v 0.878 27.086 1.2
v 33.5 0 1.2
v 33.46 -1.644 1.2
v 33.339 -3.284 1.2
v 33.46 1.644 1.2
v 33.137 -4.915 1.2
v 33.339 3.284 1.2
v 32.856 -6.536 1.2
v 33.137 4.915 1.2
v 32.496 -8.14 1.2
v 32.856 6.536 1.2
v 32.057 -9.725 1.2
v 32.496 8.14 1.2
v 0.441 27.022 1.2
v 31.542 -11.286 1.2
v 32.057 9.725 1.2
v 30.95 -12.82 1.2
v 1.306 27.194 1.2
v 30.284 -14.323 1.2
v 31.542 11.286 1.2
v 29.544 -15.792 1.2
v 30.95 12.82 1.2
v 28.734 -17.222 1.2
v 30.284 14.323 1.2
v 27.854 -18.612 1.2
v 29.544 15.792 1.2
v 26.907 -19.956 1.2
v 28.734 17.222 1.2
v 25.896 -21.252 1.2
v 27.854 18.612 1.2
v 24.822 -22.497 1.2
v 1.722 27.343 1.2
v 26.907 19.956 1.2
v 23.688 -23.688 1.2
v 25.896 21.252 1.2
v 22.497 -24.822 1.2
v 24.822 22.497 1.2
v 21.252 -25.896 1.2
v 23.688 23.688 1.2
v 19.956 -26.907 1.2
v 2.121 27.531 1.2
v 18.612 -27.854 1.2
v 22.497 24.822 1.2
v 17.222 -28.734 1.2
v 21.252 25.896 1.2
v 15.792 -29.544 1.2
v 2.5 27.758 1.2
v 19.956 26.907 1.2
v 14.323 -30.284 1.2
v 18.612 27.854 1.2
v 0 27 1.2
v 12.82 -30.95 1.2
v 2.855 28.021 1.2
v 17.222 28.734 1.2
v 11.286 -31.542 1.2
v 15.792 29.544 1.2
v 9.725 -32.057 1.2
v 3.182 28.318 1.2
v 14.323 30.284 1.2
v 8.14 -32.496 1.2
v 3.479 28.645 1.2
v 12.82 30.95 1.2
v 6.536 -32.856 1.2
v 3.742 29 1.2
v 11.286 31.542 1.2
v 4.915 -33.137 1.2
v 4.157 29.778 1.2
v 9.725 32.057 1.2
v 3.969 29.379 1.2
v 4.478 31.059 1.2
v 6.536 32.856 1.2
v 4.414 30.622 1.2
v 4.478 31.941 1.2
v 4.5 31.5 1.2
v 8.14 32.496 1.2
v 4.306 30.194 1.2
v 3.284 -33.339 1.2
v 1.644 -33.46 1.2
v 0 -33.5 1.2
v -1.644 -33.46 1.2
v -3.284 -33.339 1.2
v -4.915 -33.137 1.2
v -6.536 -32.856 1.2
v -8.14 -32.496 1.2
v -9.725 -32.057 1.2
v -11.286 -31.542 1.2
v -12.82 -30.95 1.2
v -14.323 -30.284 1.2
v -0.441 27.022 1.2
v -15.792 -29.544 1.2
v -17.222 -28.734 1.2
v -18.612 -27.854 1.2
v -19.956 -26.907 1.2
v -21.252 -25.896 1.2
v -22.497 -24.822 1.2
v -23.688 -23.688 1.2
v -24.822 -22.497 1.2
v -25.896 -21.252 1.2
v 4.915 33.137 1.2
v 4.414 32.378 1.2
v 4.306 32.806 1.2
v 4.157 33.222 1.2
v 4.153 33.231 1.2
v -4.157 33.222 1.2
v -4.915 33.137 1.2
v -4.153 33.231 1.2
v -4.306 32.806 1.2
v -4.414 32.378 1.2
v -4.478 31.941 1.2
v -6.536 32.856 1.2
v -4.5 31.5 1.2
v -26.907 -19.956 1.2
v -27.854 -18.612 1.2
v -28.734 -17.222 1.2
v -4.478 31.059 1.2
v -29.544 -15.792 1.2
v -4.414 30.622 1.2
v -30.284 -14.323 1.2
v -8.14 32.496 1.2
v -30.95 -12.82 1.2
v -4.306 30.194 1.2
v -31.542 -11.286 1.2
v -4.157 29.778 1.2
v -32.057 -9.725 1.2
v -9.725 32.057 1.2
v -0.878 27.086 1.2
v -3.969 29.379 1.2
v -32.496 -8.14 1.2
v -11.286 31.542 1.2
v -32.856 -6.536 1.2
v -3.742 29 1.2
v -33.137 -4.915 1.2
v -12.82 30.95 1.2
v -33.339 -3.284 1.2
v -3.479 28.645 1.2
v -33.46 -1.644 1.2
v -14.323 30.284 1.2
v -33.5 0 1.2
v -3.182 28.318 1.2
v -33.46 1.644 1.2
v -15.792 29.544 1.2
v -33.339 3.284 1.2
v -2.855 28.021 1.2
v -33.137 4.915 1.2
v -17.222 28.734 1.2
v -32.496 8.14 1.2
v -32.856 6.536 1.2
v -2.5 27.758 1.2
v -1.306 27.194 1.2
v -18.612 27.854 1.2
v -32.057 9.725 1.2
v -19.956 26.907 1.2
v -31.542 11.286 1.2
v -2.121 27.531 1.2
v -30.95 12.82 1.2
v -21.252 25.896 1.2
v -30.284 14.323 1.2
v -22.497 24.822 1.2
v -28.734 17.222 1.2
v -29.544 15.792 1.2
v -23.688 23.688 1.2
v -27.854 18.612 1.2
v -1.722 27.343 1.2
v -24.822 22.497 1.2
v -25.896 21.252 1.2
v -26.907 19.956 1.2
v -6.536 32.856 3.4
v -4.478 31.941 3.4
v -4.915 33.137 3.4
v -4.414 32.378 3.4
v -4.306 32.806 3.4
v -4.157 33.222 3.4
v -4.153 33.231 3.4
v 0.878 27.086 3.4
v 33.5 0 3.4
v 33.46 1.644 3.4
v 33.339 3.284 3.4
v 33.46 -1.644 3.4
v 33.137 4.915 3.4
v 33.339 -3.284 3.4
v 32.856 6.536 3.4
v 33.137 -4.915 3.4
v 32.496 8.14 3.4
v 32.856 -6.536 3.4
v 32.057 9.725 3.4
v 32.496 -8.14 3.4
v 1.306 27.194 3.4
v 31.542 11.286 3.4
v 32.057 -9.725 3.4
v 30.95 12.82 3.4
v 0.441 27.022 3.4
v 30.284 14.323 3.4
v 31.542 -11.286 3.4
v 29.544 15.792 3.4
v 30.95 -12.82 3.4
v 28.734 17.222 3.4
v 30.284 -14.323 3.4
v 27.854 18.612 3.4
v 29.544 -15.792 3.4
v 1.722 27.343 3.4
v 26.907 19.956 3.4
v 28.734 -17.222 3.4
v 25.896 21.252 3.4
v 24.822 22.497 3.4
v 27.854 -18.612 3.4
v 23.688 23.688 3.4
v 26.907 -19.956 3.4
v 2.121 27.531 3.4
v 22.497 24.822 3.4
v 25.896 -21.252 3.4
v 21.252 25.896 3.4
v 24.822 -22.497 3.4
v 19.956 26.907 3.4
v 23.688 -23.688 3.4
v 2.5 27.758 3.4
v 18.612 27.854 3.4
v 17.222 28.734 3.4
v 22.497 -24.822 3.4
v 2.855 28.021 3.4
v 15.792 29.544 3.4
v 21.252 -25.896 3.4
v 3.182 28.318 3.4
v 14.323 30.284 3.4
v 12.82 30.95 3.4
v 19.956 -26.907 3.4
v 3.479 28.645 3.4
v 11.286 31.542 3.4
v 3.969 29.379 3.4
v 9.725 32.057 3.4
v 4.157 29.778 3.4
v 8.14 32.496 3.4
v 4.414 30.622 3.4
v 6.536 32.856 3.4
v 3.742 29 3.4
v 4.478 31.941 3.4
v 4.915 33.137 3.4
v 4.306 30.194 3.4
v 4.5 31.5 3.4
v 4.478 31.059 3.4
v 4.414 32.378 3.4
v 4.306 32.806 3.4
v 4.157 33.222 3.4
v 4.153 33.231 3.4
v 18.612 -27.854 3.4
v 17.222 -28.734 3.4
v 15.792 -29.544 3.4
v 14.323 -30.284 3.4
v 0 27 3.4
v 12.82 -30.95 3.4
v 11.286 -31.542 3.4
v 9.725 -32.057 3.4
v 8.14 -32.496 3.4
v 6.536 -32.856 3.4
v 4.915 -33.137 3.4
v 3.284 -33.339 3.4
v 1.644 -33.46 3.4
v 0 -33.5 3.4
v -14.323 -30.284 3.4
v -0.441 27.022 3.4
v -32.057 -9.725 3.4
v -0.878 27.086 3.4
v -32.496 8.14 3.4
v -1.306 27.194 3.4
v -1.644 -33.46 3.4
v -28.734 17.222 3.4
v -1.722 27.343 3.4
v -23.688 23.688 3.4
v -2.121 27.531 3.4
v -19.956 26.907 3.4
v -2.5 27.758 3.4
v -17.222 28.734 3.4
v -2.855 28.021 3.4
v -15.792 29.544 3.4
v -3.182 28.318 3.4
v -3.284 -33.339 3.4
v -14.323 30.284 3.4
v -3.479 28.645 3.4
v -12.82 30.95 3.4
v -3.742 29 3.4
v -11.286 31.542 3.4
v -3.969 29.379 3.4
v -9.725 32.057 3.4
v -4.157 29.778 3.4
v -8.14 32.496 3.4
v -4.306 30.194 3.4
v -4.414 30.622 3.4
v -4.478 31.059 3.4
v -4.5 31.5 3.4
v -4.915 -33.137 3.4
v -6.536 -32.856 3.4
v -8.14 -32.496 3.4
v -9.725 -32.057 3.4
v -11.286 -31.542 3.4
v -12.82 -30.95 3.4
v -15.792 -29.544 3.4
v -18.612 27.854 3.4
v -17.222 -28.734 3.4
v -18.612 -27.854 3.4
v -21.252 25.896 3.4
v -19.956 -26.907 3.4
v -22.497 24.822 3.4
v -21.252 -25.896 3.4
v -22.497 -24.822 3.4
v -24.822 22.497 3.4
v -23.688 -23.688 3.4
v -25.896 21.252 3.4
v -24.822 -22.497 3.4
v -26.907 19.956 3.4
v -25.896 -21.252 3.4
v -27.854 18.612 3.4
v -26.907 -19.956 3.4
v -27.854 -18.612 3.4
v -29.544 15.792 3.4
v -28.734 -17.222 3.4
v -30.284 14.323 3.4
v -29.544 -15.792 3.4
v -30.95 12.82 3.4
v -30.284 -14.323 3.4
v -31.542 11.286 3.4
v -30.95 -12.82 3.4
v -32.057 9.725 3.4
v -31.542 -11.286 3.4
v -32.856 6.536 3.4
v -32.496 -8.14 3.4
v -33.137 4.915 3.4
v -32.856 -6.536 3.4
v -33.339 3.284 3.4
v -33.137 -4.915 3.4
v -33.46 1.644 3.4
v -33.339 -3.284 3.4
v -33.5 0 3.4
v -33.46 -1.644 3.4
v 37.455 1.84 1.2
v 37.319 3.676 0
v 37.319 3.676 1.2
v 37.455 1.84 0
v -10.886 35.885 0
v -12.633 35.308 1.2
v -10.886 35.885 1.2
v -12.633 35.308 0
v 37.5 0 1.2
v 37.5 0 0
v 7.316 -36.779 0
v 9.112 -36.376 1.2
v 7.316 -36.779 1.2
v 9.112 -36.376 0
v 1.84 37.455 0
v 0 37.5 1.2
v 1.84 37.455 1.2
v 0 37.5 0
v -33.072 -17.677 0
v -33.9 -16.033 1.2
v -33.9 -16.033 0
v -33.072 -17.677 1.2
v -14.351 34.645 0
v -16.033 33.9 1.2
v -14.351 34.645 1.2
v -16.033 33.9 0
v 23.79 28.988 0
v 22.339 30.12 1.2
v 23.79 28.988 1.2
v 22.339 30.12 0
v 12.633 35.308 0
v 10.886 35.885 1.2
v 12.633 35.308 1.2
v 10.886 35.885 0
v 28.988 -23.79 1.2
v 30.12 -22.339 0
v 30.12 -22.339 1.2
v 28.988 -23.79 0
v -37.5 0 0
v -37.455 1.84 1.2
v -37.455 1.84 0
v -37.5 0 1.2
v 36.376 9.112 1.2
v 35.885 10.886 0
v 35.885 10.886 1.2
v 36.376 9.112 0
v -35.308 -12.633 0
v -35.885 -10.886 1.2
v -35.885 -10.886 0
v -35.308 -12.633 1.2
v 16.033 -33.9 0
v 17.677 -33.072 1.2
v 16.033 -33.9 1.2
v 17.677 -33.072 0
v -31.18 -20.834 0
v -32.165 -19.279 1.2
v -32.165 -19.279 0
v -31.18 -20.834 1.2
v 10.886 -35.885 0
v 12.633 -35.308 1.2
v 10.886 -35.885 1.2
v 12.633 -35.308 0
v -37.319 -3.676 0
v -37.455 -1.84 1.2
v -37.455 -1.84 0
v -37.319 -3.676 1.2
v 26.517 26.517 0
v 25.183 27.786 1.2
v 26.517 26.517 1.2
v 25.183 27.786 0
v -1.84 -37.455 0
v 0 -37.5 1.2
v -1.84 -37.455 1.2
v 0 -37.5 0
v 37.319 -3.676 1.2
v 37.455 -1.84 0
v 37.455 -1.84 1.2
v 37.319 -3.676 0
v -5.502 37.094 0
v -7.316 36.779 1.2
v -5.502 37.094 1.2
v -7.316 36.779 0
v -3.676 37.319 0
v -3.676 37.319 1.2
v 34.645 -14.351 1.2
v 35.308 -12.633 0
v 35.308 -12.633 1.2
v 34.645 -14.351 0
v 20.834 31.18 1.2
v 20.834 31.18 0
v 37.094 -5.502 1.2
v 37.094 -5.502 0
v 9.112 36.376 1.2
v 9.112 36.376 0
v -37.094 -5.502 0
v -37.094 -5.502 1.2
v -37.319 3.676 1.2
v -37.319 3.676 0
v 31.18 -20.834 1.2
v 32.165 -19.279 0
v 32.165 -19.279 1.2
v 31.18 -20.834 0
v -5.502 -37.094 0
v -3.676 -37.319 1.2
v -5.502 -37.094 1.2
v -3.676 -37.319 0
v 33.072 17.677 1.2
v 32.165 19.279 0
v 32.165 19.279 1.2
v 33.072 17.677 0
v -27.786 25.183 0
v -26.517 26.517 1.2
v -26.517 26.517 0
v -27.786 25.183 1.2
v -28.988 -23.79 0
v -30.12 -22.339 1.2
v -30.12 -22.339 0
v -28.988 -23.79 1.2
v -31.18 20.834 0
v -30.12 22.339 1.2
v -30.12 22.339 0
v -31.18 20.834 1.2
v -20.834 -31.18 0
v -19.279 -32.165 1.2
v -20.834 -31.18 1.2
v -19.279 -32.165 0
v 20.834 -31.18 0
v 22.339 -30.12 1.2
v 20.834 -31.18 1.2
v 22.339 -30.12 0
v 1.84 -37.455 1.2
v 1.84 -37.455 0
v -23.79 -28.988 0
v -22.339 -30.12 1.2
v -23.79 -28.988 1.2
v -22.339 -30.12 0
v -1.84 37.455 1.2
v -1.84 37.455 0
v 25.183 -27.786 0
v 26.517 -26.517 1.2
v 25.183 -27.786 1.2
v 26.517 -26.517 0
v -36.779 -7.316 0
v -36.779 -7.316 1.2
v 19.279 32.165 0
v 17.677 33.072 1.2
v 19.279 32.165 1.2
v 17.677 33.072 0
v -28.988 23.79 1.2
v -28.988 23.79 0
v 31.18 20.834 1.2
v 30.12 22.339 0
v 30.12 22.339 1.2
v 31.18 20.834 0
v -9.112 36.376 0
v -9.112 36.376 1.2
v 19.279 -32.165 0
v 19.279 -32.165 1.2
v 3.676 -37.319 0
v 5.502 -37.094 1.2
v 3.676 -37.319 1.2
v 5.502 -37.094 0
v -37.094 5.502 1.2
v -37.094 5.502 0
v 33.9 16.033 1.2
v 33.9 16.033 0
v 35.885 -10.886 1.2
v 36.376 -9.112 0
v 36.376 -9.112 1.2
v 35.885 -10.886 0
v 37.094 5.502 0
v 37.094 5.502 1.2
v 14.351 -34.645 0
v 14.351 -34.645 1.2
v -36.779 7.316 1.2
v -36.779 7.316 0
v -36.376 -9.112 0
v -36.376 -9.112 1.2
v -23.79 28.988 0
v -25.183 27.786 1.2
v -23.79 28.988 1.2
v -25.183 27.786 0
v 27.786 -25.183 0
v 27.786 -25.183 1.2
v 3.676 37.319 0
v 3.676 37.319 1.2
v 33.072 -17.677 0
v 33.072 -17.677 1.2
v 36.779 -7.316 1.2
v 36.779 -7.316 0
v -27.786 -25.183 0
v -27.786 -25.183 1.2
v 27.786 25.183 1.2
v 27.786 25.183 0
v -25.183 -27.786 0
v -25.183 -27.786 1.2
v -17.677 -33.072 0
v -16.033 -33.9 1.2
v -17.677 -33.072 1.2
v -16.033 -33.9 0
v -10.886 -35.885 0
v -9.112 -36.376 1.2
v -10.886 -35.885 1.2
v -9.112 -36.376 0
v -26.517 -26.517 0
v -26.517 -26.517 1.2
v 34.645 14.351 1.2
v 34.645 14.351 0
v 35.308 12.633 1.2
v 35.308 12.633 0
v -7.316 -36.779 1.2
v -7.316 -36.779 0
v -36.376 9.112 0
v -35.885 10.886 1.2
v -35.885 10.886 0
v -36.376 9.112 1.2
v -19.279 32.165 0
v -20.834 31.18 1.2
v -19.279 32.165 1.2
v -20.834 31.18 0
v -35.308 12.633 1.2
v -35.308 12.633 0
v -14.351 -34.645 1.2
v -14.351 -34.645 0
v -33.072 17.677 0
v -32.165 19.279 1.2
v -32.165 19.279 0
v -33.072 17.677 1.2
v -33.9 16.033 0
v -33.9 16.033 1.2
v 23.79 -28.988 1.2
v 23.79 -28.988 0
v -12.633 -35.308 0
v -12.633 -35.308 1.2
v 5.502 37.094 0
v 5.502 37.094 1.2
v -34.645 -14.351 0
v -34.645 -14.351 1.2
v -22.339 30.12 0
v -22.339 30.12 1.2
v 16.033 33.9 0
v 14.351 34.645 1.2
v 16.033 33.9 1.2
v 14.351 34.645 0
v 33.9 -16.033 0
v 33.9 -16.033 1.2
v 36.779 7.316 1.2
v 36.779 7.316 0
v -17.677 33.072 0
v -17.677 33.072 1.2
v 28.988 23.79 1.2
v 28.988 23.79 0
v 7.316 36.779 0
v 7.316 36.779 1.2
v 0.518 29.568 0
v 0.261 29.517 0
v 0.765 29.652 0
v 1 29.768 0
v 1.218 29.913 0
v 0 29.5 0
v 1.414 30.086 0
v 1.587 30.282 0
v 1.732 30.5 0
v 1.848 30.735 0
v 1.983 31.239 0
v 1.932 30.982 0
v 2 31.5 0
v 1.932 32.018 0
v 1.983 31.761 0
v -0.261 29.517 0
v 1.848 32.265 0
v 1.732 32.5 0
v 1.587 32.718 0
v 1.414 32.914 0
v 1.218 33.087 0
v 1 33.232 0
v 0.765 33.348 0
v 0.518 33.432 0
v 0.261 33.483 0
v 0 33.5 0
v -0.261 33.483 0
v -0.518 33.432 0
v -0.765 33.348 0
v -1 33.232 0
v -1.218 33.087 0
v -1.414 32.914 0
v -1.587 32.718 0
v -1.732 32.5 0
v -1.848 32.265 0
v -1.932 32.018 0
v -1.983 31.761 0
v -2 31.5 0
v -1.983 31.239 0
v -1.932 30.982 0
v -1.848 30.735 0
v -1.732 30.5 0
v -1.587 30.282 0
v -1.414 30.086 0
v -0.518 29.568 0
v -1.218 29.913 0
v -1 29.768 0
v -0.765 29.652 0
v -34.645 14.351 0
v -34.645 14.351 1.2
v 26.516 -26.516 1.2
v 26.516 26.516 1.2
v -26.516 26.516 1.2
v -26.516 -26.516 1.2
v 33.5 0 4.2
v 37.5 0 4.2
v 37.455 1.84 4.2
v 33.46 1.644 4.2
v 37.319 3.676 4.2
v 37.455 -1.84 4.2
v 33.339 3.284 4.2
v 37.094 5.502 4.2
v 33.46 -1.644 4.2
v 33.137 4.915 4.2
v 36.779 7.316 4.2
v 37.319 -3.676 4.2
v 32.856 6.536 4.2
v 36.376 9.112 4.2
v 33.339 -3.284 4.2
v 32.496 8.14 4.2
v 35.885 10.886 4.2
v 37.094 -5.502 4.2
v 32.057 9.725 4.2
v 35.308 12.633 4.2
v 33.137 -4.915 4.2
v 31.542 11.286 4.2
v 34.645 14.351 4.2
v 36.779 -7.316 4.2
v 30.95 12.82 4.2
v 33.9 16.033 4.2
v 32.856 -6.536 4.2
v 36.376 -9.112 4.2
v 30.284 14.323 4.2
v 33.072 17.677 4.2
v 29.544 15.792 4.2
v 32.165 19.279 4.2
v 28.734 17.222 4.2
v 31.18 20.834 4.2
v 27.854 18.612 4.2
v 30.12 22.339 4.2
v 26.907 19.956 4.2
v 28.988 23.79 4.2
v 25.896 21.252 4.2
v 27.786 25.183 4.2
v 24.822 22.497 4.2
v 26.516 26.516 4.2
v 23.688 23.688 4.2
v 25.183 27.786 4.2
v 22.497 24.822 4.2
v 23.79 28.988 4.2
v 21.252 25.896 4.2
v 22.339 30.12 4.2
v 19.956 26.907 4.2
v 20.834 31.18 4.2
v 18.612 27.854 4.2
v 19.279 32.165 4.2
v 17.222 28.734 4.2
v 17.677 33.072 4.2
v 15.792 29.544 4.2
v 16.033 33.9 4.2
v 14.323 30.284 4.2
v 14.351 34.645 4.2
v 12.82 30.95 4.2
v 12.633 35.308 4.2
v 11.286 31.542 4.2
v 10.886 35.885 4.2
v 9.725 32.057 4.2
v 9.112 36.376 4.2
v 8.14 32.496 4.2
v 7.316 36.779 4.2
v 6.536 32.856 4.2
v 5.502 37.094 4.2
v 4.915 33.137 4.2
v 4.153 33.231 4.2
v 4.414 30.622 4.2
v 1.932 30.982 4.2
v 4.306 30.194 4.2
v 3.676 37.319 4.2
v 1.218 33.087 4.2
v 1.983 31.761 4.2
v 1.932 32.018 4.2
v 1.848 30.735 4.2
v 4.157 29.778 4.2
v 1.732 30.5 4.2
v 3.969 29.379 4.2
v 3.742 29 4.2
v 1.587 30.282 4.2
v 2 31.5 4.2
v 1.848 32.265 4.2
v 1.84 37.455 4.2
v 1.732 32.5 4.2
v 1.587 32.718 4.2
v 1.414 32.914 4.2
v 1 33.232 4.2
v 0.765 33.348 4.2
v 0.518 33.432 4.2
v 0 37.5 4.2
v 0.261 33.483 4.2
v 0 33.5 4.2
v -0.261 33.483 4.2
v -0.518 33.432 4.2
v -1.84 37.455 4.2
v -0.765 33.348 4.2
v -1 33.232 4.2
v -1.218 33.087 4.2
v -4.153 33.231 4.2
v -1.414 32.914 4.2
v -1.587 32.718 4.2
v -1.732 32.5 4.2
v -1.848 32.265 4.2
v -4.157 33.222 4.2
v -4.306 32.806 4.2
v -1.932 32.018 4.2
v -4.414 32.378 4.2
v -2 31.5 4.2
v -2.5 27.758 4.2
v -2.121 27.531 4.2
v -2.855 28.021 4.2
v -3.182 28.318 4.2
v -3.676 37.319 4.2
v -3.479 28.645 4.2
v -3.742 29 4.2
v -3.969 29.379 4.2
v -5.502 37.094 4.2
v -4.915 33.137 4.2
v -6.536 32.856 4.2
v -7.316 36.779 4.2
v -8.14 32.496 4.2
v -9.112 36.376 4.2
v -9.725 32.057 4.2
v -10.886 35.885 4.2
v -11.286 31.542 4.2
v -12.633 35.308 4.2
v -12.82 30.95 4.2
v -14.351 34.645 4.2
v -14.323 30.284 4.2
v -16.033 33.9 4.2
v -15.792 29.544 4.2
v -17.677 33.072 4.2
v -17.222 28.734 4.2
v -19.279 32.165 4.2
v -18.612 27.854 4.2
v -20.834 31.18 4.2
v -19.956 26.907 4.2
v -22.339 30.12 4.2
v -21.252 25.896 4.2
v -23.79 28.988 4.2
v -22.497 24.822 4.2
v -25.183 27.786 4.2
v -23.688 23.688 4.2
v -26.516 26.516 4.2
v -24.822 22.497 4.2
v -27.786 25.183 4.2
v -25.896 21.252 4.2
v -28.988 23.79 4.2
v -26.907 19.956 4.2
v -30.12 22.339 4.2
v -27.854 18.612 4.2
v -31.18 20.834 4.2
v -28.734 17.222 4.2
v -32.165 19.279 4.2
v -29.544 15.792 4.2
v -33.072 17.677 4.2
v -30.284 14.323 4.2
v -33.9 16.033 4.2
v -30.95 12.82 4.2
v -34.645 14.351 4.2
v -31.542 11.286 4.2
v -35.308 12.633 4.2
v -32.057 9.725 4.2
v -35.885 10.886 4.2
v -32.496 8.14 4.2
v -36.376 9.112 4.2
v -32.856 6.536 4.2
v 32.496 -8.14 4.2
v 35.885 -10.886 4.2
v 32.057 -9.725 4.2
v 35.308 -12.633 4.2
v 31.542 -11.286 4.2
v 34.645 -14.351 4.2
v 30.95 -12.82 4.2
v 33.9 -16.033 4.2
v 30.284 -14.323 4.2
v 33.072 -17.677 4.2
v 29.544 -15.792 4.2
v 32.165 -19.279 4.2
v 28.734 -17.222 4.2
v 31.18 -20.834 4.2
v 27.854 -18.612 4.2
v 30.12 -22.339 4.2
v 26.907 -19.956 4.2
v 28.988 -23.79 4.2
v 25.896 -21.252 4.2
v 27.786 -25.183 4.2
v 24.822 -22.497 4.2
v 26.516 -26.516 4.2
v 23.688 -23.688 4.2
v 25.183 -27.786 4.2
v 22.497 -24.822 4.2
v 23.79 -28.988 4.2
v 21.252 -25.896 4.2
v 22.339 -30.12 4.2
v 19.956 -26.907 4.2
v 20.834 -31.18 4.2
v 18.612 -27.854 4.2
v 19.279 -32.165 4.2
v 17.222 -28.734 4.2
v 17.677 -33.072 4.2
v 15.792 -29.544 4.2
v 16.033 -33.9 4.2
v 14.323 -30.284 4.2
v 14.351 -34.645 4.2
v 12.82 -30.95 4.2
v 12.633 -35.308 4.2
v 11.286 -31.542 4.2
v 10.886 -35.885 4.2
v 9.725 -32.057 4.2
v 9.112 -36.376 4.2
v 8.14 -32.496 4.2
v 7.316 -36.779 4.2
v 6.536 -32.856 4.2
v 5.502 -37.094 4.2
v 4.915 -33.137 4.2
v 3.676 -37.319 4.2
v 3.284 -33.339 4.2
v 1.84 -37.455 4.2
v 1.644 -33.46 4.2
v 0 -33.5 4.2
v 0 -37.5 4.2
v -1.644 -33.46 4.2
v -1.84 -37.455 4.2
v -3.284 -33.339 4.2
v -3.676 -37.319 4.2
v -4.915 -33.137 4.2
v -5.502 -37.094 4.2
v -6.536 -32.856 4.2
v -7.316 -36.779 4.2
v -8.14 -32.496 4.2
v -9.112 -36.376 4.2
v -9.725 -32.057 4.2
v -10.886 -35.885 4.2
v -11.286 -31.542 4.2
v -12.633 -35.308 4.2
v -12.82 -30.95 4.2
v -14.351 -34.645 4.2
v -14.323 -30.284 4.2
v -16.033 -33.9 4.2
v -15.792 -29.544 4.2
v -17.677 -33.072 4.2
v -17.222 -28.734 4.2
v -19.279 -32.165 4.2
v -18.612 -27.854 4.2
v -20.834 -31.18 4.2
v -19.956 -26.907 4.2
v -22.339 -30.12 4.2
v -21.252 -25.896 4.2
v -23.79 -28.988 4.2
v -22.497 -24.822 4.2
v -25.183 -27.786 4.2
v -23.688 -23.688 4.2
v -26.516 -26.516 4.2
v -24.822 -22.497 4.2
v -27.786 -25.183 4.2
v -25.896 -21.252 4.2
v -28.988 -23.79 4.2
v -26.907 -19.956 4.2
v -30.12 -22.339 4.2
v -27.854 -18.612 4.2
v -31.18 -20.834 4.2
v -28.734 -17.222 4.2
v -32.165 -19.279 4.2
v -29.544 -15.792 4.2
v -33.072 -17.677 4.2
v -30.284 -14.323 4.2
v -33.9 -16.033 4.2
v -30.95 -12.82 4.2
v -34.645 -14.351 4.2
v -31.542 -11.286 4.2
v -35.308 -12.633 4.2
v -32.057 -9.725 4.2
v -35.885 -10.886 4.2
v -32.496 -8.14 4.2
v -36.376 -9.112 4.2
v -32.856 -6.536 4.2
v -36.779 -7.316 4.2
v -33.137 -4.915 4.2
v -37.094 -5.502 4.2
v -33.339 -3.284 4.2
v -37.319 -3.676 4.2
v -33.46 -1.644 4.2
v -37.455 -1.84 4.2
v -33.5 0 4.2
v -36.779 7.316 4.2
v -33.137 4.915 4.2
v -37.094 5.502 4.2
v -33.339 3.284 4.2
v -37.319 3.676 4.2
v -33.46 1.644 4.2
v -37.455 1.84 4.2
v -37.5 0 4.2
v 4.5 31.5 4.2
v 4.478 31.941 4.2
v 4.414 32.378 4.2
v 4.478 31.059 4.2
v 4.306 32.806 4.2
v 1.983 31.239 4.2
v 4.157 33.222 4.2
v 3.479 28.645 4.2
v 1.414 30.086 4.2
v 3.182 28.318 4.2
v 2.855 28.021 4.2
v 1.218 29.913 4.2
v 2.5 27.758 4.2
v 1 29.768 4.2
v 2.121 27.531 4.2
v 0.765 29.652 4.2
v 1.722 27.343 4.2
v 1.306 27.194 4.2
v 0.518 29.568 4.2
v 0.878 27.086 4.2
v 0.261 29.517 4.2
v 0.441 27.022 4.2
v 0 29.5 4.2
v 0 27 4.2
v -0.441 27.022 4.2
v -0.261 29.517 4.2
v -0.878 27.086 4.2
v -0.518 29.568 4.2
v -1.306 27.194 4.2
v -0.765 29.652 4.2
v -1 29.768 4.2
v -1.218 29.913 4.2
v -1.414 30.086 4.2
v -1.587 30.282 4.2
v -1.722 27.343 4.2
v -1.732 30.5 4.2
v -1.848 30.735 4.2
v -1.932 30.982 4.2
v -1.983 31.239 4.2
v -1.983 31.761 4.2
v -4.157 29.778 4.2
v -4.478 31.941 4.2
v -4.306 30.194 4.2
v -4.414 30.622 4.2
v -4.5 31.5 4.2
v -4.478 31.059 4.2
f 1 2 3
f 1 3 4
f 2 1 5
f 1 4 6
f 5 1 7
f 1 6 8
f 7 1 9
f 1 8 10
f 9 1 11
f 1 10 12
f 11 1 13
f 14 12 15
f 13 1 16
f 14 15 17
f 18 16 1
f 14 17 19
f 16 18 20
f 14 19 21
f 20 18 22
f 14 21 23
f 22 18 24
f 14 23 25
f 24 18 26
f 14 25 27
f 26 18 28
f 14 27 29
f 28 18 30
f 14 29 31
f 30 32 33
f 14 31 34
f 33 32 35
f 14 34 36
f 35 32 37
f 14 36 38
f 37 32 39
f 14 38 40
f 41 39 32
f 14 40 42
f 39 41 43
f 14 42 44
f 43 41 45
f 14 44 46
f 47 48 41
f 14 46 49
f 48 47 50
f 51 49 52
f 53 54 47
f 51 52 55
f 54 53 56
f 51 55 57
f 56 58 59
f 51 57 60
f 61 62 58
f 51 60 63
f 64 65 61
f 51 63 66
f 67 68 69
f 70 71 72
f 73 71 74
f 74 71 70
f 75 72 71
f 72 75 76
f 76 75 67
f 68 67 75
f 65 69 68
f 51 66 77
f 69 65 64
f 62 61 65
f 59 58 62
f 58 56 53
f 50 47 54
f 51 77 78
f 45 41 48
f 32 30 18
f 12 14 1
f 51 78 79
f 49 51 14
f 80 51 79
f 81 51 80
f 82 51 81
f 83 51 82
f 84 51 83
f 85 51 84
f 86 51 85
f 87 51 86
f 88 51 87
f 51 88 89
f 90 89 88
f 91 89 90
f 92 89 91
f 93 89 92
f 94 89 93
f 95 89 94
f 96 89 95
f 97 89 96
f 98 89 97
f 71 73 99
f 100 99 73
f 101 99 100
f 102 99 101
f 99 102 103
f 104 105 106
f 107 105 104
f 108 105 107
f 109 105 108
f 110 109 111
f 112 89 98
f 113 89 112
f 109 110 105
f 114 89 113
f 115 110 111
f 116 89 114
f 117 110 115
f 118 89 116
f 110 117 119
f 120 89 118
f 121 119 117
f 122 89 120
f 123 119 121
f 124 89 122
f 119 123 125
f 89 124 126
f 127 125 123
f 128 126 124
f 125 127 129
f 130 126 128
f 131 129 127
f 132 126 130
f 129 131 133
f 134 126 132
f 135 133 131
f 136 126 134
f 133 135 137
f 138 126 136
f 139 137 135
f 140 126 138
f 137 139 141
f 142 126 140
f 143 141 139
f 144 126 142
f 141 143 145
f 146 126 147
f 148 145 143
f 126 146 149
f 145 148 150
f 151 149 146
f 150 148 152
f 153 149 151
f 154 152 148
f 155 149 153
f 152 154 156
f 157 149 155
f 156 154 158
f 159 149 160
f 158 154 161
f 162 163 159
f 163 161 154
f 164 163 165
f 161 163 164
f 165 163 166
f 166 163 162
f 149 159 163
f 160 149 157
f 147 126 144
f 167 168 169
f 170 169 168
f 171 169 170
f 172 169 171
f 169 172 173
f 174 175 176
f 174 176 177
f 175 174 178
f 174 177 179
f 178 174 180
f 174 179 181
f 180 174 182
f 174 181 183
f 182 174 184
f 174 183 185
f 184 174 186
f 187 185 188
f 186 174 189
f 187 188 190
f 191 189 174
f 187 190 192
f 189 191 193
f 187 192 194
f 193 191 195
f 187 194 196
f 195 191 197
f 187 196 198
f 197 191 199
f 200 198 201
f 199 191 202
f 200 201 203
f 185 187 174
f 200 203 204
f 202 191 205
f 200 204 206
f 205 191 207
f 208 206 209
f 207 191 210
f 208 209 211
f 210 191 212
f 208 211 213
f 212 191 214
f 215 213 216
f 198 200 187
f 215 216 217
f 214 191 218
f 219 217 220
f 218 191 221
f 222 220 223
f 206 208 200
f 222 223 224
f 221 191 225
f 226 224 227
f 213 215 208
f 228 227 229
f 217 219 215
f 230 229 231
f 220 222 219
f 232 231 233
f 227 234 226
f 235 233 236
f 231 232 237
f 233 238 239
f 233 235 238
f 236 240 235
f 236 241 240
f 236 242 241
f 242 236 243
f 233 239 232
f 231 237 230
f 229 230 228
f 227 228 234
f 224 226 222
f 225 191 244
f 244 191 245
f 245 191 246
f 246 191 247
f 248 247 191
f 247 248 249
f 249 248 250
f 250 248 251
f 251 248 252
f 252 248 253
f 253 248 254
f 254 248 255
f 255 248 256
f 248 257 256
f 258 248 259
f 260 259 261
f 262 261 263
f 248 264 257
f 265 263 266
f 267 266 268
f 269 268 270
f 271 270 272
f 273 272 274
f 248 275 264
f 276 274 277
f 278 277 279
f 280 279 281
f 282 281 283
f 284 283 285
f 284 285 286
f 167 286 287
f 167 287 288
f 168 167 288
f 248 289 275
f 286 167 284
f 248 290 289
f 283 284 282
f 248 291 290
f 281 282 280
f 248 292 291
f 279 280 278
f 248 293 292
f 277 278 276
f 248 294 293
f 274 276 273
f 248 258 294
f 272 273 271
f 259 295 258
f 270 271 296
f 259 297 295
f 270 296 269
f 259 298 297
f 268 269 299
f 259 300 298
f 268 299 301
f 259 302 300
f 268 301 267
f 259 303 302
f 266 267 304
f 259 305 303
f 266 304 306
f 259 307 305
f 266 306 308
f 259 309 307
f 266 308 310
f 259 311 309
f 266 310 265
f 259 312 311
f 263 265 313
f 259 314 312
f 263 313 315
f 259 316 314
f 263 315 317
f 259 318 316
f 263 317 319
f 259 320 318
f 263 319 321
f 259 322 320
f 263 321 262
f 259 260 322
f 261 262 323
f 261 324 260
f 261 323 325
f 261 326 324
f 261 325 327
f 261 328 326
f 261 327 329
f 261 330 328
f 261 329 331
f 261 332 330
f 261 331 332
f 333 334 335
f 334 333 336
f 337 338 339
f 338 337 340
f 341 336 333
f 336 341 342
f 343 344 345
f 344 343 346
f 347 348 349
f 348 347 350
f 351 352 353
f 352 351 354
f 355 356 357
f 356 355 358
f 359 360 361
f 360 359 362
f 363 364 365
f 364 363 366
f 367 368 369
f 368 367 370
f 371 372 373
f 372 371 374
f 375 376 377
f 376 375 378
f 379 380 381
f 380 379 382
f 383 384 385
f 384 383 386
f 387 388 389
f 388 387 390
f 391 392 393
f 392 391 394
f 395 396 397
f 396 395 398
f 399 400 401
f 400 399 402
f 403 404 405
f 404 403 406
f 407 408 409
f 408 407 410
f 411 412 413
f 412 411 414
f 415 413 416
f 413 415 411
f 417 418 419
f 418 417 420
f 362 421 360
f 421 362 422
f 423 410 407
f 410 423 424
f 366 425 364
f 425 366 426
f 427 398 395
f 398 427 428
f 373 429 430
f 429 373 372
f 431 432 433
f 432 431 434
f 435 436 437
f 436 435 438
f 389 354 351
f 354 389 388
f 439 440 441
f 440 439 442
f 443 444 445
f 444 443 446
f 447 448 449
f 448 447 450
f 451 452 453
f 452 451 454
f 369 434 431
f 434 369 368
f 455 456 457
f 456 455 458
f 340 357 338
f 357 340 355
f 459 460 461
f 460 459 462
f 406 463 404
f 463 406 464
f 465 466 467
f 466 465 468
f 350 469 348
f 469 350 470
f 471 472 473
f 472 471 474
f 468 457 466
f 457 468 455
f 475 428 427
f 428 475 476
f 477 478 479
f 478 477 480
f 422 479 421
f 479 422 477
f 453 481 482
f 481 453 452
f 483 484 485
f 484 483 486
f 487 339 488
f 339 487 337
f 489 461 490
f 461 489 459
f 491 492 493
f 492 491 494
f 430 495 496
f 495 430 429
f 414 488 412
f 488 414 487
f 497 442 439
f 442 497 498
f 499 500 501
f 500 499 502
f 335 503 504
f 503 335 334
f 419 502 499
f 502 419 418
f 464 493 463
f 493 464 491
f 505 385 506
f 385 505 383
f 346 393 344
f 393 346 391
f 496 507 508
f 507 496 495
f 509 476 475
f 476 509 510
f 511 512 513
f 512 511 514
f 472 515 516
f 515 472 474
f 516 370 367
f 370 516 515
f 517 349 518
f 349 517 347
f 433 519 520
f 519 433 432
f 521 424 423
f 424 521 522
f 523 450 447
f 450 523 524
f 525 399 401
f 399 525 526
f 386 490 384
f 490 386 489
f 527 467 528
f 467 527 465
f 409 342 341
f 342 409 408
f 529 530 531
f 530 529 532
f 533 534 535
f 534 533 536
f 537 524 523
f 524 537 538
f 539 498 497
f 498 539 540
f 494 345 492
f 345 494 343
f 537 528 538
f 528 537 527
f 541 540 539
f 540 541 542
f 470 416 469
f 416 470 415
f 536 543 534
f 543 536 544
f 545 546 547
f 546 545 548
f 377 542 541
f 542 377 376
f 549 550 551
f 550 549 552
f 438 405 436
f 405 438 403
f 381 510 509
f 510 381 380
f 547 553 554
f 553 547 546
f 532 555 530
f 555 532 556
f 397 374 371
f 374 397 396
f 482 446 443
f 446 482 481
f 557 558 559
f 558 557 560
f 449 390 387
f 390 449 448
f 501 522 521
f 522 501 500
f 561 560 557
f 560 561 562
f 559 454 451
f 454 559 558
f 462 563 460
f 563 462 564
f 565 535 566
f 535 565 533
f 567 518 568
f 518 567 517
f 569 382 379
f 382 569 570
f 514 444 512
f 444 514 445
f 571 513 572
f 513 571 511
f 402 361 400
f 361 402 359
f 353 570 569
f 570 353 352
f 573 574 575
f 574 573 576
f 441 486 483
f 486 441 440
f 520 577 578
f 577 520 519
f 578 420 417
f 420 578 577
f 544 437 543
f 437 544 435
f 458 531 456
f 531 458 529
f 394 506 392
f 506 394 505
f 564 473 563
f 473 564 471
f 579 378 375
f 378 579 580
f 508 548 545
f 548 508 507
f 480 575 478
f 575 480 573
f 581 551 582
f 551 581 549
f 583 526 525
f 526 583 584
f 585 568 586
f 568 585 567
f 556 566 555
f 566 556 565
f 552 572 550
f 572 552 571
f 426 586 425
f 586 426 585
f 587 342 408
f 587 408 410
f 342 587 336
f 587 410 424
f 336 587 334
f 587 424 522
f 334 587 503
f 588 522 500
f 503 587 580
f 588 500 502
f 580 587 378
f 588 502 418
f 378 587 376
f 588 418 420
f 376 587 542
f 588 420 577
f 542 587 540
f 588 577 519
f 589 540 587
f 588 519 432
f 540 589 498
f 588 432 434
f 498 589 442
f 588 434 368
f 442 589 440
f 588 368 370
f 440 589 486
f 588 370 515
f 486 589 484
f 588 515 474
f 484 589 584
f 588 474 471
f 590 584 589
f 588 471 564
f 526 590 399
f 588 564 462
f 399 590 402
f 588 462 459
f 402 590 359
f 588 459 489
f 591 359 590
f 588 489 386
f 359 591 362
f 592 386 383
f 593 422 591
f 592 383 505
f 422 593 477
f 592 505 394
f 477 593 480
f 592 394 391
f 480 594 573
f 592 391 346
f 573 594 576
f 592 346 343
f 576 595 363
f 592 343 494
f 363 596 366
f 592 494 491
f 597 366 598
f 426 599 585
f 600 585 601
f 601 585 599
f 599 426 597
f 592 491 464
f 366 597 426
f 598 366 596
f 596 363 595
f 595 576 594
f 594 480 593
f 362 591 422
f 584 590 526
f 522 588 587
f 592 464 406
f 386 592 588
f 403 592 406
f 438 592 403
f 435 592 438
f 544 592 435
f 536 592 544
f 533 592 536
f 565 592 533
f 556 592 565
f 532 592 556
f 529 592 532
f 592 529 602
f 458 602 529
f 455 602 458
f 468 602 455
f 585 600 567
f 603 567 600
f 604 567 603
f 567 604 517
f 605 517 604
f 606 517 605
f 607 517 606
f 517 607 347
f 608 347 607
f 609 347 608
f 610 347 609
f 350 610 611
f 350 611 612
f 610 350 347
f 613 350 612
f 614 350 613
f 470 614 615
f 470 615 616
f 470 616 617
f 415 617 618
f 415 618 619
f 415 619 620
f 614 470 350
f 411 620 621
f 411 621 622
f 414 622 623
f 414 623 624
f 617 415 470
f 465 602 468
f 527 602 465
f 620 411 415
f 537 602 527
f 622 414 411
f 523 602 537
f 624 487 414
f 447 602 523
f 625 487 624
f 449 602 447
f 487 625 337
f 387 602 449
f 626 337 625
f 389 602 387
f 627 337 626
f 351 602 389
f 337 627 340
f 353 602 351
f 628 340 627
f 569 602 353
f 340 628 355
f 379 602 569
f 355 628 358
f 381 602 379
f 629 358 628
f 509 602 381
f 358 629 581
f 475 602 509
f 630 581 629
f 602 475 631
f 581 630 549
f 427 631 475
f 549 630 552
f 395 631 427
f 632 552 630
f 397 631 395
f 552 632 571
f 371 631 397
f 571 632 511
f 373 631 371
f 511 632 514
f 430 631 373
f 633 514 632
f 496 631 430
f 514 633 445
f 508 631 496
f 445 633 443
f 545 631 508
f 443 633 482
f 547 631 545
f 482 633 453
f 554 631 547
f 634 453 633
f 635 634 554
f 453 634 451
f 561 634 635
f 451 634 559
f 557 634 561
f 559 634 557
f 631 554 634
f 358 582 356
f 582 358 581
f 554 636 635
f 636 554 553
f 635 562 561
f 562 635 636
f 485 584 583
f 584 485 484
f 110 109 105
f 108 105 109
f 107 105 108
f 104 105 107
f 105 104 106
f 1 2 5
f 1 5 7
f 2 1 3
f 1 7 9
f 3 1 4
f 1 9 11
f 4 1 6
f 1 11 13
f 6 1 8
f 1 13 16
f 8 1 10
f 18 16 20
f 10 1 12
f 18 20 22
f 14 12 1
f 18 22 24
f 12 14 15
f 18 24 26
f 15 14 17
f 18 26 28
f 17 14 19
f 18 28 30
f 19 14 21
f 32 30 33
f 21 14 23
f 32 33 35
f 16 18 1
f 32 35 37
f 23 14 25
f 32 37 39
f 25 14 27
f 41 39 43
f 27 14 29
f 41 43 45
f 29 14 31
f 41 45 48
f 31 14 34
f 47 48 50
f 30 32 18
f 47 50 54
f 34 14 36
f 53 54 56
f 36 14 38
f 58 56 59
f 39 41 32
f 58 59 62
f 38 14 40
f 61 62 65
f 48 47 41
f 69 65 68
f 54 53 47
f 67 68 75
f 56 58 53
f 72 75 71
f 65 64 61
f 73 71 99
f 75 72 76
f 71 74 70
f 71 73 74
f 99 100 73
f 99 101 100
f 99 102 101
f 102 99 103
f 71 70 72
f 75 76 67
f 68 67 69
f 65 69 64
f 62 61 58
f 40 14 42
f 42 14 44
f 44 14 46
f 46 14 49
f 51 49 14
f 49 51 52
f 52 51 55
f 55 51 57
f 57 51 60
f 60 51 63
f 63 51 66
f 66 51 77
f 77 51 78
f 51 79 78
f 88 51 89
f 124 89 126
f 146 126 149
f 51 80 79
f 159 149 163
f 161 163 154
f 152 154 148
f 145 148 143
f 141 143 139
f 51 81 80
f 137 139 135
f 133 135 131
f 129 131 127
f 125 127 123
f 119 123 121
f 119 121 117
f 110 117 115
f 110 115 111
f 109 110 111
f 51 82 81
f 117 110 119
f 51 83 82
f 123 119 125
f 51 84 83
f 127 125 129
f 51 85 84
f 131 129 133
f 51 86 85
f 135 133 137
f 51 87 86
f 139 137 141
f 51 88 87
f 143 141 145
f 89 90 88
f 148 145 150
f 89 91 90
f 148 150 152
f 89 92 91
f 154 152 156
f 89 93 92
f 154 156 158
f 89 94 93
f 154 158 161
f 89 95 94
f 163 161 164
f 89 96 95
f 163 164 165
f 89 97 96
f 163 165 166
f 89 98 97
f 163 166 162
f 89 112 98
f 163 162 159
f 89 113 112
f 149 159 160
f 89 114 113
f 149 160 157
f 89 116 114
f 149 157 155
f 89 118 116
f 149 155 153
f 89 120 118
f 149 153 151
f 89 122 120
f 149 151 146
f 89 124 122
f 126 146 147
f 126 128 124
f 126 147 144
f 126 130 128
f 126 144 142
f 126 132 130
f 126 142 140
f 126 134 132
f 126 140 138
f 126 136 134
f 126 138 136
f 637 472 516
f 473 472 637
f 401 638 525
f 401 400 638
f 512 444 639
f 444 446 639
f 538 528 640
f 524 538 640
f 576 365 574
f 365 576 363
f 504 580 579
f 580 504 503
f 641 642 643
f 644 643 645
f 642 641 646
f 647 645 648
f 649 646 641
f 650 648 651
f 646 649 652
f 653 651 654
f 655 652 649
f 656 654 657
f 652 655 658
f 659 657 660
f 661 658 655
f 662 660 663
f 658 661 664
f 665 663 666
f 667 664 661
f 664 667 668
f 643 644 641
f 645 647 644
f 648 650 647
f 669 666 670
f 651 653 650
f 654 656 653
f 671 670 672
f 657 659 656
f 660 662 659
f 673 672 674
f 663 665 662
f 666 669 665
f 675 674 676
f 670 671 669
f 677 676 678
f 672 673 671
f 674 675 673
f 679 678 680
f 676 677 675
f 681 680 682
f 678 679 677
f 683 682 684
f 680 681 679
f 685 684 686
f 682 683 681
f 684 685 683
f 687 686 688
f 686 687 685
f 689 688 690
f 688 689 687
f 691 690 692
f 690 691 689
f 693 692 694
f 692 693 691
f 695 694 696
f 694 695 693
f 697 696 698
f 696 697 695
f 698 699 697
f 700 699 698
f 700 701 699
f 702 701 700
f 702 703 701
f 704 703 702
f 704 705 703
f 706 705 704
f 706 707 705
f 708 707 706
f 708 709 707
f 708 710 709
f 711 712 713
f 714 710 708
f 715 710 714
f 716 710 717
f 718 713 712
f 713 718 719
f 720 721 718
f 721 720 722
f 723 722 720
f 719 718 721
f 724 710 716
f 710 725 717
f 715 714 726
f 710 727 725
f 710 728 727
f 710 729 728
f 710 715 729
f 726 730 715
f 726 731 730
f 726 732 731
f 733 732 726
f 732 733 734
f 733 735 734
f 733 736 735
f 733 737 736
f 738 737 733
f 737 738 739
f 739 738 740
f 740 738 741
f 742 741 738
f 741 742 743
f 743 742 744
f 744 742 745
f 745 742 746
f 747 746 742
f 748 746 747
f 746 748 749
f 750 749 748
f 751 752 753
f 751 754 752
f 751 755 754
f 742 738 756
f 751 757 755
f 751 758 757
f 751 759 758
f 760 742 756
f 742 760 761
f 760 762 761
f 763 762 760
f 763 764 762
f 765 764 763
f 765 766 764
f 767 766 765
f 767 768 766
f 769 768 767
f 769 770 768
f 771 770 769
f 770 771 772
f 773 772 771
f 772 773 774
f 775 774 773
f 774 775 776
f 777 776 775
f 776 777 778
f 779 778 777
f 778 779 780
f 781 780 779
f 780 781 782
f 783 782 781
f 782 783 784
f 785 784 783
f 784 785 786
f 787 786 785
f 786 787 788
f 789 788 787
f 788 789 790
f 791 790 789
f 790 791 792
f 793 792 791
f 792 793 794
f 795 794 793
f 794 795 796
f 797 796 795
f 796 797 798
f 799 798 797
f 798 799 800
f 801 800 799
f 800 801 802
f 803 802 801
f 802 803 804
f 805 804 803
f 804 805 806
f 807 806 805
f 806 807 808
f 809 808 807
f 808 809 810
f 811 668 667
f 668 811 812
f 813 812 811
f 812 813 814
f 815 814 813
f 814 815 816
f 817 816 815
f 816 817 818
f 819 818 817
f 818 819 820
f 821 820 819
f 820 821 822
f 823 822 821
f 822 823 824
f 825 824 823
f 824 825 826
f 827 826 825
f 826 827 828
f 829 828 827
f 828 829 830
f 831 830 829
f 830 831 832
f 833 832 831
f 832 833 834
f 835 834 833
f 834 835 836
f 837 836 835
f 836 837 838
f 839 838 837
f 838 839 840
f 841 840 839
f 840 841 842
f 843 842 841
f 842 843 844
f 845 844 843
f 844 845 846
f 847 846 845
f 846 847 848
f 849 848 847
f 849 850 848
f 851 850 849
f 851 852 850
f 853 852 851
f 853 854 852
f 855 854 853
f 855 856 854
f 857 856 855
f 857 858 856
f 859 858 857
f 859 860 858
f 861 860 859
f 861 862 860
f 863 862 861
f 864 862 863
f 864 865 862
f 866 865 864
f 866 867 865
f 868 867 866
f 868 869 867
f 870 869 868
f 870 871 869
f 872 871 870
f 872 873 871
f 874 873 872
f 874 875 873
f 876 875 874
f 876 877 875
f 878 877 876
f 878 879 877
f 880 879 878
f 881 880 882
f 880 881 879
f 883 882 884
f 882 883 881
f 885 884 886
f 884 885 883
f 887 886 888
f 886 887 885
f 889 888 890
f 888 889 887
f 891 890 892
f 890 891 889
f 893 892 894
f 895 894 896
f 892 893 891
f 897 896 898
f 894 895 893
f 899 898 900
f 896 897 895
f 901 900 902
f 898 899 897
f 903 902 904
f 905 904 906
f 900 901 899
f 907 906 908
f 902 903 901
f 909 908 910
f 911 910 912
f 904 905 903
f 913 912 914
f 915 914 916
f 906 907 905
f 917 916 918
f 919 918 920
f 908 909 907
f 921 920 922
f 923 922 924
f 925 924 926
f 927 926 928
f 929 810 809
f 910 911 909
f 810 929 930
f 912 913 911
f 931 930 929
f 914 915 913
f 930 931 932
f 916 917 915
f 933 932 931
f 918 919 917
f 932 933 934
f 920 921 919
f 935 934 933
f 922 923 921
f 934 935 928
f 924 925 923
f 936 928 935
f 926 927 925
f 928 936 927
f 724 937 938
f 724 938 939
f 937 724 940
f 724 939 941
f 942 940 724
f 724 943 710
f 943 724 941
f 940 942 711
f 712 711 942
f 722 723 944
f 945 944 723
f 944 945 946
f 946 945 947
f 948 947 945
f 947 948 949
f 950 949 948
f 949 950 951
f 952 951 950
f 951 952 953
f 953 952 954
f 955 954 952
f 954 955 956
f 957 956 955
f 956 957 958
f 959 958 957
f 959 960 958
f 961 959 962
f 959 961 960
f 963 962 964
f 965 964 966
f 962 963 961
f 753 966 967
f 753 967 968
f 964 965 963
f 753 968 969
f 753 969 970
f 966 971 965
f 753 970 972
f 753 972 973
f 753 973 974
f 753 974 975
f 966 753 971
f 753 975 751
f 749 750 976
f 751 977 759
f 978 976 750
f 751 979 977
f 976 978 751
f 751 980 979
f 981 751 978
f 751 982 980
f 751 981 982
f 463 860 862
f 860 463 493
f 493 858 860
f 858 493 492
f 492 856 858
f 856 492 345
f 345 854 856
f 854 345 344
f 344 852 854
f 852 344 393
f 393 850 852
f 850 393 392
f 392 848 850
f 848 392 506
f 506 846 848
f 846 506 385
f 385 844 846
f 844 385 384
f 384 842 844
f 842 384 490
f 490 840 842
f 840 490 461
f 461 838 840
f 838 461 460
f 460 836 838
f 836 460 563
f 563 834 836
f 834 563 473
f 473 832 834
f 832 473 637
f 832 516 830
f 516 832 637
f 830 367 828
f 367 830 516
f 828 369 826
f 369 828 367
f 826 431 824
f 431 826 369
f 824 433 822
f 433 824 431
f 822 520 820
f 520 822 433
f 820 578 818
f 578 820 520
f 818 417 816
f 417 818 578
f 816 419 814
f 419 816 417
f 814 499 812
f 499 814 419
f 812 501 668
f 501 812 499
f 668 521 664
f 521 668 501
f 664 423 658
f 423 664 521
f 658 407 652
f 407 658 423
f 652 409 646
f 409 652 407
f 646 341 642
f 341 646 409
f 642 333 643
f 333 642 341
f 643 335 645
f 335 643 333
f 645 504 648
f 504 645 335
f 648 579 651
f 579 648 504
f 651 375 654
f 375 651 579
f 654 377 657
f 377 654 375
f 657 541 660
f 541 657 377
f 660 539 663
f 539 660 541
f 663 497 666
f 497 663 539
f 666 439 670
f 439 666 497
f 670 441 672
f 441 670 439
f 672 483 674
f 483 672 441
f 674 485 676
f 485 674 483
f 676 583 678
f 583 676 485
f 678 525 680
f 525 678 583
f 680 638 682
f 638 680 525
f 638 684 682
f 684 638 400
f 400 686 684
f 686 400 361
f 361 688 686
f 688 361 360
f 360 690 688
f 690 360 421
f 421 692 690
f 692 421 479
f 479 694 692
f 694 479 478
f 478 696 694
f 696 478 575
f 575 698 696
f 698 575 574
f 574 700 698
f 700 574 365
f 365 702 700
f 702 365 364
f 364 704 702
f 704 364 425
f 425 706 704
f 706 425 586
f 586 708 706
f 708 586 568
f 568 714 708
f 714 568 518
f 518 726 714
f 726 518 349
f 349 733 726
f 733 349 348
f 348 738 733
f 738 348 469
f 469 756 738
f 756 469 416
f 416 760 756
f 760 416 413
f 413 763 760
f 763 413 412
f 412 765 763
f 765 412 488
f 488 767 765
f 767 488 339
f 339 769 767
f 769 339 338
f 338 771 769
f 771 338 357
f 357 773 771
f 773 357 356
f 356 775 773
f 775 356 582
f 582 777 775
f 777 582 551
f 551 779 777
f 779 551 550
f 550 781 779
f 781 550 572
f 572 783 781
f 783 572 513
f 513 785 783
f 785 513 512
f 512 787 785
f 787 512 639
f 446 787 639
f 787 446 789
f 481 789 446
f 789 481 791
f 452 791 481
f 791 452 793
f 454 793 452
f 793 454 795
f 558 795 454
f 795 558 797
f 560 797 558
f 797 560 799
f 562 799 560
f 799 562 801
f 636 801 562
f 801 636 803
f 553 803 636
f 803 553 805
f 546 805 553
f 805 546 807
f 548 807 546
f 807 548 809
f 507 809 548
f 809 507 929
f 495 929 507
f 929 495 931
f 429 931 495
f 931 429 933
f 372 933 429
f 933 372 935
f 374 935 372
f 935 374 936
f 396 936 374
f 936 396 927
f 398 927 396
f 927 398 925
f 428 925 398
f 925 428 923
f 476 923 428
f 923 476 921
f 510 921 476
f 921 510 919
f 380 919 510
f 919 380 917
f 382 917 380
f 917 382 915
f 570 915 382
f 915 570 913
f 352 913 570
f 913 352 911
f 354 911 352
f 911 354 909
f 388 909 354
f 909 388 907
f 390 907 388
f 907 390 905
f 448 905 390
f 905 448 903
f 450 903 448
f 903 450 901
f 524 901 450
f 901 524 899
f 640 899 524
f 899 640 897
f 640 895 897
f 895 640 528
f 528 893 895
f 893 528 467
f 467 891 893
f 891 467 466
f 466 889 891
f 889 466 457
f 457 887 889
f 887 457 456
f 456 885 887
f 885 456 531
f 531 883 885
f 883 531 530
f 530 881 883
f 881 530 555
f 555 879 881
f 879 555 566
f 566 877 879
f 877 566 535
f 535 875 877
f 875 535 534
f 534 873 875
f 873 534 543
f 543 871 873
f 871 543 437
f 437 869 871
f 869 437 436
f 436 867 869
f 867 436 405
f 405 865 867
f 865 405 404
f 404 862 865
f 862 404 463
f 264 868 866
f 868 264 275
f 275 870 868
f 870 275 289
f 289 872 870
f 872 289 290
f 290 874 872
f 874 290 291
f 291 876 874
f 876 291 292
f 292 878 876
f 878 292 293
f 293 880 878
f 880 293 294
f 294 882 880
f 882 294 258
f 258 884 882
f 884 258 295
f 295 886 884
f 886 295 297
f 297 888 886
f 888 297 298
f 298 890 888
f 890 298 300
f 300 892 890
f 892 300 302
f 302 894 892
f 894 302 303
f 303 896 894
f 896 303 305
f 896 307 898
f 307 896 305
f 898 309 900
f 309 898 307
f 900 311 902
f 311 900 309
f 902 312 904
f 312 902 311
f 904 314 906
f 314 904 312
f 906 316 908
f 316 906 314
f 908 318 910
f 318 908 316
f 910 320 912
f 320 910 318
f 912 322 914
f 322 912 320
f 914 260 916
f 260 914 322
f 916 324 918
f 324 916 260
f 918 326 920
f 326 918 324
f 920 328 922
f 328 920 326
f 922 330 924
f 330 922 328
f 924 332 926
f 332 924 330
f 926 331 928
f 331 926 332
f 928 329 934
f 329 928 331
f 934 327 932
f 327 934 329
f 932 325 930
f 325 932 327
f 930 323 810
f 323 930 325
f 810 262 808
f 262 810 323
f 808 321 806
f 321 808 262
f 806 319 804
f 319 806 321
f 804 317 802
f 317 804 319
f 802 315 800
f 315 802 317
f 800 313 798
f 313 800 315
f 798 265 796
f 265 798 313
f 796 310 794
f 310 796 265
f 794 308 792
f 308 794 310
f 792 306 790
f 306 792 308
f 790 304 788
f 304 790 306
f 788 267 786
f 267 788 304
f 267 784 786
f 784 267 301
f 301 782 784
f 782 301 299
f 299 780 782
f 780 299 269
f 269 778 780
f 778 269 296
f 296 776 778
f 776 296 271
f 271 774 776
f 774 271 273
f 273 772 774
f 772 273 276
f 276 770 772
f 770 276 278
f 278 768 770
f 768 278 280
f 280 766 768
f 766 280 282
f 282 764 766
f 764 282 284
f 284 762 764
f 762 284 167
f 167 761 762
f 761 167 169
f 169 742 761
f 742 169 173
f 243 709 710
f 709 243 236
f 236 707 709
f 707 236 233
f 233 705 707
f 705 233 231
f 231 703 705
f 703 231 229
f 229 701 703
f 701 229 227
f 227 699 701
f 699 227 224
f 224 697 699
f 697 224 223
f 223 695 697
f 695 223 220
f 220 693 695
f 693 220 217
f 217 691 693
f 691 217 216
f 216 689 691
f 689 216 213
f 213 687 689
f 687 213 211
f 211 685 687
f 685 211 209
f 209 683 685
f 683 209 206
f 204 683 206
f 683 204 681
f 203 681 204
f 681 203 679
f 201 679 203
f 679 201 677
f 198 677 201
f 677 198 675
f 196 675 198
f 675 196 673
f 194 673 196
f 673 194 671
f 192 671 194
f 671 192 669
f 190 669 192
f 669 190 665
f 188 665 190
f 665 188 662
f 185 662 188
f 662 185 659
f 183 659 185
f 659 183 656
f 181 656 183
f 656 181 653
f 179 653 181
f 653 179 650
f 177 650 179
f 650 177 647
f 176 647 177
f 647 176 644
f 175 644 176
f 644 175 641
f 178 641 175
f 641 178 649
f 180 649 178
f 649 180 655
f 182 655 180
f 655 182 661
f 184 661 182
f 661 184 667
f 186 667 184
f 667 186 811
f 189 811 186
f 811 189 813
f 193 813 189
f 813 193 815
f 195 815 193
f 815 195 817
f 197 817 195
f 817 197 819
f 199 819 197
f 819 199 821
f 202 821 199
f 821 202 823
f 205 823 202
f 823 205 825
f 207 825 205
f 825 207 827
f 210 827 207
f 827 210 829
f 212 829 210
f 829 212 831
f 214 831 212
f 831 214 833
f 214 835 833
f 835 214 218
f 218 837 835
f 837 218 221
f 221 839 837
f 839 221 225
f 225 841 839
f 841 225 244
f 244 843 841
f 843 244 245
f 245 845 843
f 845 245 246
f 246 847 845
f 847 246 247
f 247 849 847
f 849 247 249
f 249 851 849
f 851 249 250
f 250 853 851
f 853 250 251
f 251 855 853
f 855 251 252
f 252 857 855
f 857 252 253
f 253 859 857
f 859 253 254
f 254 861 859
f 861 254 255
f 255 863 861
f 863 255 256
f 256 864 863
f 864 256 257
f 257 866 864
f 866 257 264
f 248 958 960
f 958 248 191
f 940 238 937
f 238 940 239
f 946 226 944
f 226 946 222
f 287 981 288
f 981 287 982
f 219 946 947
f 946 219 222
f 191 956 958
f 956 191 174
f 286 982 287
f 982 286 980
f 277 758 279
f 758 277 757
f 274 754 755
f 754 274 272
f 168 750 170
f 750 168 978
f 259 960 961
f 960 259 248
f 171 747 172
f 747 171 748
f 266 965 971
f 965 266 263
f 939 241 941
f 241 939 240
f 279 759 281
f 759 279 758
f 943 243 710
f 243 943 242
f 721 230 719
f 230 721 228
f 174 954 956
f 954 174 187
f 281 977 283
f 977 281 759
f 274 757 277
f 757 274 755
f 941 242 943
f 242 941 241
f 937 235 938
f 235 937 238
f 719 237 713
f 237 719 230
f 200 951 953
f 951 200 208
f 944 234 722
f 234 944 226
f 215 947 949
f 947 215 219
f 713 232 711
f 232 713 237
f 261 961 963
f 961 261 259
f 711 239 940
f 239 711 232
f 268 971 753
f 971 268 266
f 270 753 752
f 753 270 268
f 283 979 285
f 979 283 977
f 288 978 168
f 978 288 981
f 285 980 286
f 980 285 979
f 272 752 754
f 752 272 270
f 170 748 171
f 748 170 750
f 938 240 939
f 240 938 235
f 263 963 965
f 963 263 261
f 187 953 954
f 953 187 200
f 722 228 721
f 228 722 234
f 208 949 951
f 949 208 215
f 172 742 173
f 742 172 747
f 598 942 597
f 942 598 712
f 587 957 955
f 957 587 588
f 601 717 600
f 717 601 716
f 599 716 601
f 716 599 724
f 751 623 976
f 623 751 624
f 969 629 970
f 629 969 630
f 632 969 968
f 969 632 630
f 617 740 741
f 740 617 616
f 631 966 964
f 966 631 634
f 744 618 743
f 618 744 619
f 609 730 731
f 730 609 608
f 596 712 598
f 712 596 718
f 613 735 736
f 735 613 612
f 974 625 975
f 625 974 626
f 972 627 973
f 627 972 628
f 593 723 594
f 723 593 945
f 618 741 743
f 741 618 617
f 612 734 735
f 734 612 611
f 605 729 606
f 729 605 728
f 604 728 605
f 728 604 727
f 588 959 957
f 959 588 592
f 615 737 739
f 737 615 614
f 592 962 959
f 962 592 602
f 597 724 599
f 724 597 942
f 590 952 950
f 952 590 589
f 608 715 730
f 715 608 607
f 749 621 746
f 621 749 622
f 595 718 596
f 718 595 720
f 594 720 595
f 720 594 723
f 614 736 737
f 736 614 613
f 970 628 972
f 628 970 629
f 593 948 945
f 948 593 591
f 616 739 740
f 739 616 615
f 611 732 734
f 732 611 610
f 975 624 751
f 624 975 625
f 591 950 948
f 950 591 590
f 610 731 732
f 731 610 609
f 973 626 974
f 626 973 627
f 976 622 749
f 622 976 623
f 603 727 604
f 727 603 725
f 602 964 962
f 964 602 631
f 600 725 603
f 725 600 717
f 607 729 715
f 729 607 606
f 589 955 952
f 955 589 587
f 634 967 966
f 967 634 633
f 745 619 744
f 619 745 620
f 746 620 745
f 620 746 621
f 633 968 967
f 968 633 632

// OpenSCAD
// lithophane_ornament/model.scad
// Round photo lithophane with a hanger hole. Fallback path — the app
// normally builds this template with the native Python mesher
// (src/core/litho_mesh.py, shape "ornament"), which is ~700x faster.

photo_path    = "";
photo_cols    = 200;
photo_rows    = 200;
diameter      = 75;
frame_width   = 4;
hole_d        = 4;
hole_ring     = 2.5;
min_thickness = 0.8;
max_thickness = 3.0;
base_height   = 1.2;

inner_d = diameter - 2 * frame_width;
hole_cy = diameter/2 - hole_d/2 - max(frame_width, 3);

module litho_fill() {
  intersection() {
    union() {
      linear_extrude(height = min_thickness)
        circle(d = inner_d, $fn = 128);
      if (photo_path != "") {
        translate([0, 0, min_thickness])
          scale([inner_d / photo_cols,
                 inner_d / photo_rows,
                 (max_thickness - min_thickness) / 255.0])
            surface(file = photo_path, center = true, invert = false, convexity = 4);
      } else {
        linear_extrude(height = max_thickness - min_thickness)
          circle(d = inner_d, $fn = 128);
      }
    }
    linear_extrude(height = max_thickness + 1)
      circle(d = inner_d, $fn = 128);
  }
}

difference() {
  union() {
    // Base plate
    linear_extrude(height = base_height)
      circle(d = diameter, $fn = 128);

    // Frame ring
    translate([0, 0, base_height])
      linear_extrude(height = max_thickness)
        difference() {
          circle(d = diameter, $fn = 128);
          circle(d = inner_d, $fn = 128);
        }

    // Lithophane fill
    translate([0, 0, base_height])
      litho_fill();

    // Reinforcement ring around the hanger hole
    translate([0, hole_cy, 0])
      linear_extrude(height = base_height + max_thickness)
        circle(d = hole_d + 2 * hole_ring, $fn = 64);
  }

  // Hanger hole
  translate([0, hole_cy, -1])
    cylinder(h = base_height + max_thickness + 2, d = hole_d, $fn = 48);
}
